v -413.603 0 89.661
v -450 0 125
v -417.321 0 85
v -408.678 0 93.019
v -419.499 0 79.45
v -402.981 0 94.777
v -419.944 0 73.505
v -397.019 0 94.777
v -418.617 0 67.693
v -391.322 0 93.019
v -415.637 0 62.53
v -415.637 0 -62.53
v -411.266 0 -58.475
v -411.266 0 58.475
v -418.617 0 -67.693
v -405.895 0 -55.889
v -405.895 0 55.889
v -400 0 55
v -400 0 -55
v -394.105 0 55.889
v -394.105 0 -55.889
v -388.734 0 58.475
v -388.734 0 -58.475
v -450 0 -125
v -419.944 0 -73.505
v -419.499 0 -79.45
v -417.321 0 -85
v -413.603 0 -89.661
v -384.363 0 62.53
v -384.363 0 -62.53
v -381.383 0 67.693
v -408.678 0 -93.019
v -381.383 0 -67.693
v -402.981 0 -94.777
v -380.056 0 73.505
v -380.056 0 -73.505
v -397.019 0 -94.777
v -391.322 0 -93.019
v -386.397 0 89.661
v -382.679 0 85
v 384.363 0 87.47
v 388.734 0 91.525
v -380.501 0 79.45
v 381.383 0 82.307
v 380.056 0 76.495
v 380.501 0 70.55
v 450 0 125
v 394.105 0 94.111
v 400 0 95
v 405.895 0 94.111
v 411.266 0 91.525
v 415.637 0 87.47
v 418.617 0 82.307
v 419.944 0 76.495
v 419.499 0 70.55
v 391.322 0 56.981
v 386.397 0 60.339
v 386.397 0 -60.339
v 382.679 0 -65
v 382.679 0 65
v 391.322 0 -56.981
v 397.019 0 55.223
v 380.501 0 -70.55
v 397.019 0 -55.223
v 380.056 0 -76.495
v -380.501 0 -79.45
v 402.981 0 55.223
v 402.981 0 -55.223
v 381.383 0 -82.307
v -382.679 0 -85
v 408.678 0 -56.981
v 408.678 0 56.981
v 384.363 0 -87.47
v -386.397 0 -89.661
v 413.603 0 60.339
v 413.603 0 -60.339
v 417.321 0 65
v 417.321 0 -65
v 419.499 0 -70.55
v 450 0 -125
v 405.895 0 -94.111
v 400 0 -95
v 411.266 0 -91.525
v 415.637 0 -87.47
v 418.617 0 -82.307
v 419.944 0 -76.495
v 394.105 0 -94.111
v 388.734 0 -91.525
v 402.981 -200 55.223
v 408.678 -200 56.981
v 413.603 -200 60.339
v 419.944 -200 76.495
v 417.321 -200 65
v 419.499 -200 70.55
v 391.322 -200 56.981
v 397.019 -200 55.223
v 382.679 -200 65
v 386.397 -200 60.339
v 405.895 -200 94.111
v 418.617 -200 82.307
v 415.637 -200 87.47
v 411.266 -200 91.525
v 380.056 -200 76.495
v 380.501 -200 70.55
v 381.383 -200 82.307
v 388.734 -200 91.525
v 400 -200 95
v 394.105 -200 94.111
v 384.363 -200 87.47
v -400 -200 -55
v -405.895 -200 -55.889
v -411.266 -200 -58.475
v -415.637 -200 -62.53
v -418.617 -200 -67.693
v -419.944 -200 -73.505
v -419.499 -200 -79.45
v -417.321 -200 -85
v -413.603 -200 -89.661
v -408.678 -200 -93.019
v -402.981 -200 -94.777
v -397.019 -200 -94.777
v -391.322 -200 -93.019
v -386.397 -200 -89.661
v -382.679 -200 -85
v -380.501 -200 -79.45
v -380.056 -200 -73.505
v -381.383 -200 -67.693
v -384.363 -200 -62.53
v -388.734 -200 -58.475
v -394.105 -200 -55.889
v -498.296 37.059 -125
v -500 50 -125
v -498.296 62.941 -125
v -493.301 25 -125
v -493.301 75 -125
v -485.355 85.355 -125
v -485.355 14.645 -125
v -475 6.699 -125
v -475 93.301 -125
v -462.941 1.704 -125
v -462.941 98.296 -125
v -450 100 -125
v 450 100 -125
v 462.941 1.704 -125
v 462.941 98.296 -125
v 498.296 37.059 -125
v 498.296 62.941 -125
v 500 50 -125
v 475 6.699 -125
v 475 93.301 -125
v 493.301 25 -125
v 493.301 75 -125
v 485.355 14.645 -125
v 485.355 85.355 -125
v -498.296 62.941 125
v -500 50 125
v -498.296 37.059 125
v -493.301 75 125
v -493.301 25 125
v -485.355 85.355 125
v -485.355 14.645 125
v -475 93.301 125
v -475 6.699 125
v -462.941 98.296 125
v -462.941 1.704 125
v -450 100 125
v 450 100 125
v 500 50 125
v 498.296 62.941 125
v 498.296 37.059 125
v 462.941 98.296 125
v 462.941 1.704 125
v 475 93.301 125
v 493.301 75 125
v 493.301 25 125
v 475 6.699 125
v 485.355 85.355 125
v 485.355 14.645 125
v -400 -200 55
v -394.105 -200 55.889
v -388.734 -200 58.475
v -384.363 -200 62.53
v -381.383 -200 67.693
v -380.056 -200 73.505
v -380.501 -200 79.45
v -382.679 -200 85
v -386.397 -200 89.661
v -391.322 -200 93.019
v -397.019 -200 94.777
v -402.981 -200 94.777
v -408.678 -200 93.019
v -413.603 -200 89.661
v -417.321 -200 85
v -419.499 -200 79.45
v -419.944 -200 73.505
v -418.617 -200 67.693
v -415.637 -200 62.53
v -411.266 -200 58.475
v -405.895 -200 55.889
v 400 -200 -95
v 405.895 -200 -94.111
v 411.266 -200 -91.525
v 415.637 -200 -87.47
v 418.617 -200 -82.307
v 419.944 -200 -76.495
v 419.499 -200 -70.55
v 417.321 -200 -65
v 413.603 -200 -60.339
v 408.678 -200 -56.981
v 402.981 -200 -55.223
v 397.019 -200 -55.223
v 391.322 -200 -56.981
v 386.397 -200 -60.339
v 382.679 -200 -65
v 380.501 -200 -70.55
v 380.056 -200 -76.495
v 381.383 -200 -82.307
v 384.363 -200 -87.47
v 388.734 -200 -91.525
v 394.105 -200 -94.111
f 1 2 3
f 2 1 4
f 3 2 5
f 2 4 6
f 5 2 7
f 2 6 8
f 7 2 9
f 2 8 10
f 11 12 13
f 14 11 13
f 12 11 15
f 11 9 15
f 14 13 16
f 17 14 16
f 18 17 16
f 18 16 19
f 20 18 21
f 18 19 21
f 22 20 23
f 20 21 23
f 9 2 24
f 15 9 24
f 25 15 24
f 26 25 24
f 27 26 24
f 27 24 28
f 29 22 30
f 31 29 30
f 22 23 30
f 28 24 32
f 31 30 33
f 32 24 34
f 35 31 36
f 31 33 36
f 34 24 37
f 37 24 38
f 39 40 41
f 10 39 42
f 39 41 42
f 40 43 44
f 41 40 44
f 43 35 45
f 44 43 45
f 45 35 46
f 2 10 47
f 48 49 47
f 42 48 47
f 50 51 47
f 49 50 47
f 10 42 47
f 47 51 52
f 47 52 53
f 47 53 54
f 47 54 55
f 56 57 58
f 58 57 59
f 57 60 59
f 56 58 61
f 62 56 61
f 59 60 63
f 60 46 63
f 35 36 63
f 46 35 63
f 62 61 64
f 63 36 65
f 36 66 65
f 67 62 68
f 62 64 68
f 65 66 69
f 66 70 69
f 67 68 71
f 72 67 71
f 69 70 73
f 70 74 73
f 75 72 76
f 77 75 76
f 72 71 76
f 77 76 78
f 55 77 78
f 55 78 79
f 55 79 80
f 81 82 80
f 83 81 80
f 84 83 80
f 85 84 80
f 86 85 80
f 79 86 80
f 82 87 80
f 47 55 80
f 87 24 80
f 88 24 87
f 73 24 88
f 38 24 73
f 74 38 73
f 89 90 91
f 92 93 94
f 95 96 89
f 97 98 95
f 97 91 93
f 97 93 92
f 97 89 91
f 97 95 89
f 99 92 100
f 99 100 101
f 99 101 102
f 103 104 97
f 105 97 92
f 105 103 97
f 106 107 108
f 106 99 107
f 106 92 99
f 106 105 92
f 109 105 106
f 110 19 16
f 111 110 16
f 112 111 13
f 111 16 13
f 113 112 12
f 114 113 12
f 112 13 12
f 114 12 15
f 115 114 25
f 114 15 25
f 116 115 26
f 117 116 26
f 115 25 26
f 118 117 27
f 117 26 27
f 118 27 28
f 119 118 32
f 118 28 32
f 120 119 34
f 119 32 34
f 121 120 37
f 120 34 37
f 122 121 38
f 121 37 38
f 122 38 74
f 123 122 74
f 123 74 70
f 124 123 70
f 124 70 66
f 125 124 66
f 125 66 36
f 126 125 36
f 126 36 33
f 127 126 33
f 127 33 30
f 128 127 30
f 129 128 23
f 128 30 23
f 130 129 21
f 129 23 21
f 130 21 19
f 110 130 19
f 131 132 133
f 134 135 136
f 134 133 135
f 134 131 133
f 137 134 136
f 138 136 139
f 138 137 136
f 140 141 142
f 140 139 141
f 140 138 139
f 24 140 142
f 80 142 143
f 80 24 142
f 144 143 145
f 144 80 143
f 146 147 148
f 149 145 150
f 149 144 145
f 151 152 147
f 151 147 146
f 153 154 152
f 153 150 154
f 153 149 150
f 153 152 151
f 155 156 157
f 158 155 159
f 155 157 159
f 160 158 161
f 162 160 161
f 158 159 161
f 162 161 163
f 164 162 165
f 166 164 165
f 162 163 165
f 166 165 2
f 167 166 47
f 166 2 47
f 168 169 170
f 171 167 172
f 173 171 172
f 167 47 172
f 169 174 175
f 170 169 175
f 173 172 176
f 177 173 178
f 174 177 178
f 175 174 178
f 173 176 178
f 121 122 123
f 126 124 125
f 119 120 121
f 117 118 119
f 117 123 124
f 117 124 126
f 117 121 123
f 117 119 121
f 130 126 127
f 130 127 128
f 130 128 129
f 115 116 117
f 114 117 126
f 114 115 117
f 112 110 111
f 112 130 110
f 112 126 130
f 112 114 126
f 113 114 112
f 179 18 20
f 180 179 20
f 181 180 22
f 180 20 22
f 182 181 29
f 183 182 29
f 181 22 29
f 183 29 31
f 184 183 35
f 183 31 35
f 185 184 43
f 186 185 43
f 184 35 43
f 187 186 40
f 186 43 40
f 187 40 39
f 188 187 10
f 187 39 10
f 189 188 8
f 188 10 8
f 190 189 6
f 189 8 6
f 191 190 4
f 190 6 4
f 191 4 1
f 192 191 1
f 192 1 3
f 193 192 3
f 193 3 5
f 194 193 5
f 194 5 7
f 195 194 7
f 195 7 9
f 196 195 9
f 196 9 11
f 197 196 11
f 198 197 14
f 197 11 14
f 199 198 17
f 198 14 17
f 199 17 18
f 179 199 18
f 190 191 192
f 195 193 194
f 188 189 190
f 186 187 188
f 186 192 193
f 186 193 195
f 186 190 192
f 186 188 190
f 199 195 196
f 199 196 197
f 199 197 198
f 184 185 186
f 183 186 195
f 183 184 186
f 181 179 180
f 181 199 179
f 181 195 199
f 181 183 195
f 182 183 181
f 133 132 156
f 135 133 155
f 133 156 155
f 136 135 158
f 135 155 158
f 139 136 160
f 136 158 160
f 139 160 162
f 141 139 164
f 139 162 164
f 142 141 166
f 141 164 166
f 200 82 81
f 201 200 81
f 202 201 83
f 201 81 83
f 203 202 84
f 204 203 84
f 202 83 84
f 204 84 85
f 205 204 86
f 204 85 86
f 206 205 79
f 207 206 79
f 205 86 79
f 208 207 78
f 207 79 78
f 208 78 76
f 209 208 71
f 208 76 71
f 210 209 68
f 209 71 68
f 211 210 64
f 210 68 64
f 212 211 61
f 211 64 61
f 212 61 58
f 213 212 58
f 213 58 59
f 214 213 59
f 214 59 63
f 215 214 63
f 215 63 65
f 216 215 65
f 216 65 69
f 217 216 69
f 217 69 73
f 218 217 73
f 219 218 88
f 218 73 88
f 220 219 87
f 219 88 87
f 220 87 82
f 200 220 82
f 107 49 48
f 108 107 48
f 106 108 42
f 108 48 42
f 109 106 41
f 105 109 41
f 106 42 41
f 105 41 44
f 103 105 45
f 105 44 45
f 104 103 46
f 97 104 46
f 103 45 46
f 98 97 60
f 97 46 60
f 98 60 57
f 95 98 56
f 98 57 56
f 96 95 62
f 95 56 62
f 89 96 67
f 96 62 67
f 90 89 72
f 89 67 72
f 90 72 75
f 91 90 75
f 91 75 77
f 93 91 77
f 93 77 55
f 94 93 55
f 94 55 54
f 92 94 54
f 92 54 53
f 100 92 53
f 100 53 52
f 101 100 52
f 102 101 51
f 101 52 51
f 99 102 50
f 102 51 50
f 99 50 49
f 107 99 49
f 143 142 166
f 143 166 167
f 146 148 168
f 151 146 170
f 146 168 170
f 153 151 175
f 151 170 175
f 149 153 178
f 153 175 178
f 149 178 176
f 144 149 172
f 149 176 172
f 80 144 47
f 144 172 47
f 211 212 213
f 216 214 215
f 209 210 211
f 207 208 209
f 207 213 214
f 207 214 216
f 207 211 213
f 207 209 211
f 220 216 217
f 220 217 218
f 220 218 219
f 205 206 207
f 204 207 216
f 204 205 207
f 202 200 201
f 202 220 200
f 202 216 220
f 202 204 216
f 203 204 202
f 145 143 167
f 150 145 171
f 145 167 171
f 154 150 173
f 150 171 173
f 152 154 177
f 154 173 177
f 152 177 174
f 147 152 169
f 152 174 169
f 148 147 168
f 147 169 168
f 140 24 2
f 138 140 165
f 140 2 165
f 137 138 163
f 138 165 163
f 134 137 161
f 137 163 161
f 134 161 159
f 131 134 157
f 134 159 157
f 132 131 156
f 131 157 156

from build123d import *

# Parameters (mm, degrees)
SKETCH1_W           = 1000
SKETCH1_H           = 250
BOSS_EXTRUDE1_DEPTH = 100
CUT_EXTRUDE1_DEPTH  = 568.89083458
SKETCH3_R           = 20
BOSS_EXTRUDE2_DEPTH = 200


with BuildPart() as part:
    # Sketch1 → Boss-Extrude1 (new body)
    with BuildSketch(Plane(origin=(0, 0, 0), x_dir=(1, 0, 0), z_dir=(0, 1, 0))):
        Rectangle(SKETCH1_W, SKETCH1_H)
    extrude(amount=BOSS_EXTRUDE1_DEPTH)

    # Sketch2 → Cut-Extrude1 (cut, through all)
    with BuildSketch(Plane.XY.offset(125)):
        with BuildLine():
            ThreePointArc((-500, 50), (-485.355339059, 85.355339059), (-450, 100))
            Line((-450, 100), (-500, 100))
            Line((-500, 100), (-500, 50))
        make_face()
        with BuildLine():
            ThreePointArc((-450, 0), (-485.355339059, 14.644660941), (-500, 50))
            Line((-500, 50), (-500, 0))
            Line((-500, 0), (-450, 0))
        make_face()
        with BuildLine():
            Line((500, 100), (450, 100))
            ThreePointArc((450, 100), (485.355339059, 85.355339059), (500, 50))
            Line((500, 50), (500, 100))
        make_face()
        with BuildLine():
            Line((500, 0), (500, 50))
            ThreePointArc((500, 50), (485.355339059, 14.644660941), (450, 0))
            Line((450, 0), (500, 0))
        make_face()
    extrude(amount=-CUT_EXTRUDE1_DEPTH, mode=Mode.SUBTRACT)

    # Sketch3 → Boss-Extrude2 (add)
    with BuildSketch(Plane.XZ):
        with Locations(Location((-400, 75, 0), (0, 0, 270))):
            Circle(SKETCH3_R)
        with Locations(Location((400, 75, 0), (0, 0, 90))):
            Circle(SKETCH3_R)
        with Locations(Location((400, -75, 0), (0, 0, 270))):
            Circle(SKETCH3_R)
        with Locations(Location((-400, -75, 0), (0, 0, 90))):
            Circle(SKETCH3_R)
    extrude(amount=BOSS_EXTRUDE2_DEPTH)


solid = part.part
